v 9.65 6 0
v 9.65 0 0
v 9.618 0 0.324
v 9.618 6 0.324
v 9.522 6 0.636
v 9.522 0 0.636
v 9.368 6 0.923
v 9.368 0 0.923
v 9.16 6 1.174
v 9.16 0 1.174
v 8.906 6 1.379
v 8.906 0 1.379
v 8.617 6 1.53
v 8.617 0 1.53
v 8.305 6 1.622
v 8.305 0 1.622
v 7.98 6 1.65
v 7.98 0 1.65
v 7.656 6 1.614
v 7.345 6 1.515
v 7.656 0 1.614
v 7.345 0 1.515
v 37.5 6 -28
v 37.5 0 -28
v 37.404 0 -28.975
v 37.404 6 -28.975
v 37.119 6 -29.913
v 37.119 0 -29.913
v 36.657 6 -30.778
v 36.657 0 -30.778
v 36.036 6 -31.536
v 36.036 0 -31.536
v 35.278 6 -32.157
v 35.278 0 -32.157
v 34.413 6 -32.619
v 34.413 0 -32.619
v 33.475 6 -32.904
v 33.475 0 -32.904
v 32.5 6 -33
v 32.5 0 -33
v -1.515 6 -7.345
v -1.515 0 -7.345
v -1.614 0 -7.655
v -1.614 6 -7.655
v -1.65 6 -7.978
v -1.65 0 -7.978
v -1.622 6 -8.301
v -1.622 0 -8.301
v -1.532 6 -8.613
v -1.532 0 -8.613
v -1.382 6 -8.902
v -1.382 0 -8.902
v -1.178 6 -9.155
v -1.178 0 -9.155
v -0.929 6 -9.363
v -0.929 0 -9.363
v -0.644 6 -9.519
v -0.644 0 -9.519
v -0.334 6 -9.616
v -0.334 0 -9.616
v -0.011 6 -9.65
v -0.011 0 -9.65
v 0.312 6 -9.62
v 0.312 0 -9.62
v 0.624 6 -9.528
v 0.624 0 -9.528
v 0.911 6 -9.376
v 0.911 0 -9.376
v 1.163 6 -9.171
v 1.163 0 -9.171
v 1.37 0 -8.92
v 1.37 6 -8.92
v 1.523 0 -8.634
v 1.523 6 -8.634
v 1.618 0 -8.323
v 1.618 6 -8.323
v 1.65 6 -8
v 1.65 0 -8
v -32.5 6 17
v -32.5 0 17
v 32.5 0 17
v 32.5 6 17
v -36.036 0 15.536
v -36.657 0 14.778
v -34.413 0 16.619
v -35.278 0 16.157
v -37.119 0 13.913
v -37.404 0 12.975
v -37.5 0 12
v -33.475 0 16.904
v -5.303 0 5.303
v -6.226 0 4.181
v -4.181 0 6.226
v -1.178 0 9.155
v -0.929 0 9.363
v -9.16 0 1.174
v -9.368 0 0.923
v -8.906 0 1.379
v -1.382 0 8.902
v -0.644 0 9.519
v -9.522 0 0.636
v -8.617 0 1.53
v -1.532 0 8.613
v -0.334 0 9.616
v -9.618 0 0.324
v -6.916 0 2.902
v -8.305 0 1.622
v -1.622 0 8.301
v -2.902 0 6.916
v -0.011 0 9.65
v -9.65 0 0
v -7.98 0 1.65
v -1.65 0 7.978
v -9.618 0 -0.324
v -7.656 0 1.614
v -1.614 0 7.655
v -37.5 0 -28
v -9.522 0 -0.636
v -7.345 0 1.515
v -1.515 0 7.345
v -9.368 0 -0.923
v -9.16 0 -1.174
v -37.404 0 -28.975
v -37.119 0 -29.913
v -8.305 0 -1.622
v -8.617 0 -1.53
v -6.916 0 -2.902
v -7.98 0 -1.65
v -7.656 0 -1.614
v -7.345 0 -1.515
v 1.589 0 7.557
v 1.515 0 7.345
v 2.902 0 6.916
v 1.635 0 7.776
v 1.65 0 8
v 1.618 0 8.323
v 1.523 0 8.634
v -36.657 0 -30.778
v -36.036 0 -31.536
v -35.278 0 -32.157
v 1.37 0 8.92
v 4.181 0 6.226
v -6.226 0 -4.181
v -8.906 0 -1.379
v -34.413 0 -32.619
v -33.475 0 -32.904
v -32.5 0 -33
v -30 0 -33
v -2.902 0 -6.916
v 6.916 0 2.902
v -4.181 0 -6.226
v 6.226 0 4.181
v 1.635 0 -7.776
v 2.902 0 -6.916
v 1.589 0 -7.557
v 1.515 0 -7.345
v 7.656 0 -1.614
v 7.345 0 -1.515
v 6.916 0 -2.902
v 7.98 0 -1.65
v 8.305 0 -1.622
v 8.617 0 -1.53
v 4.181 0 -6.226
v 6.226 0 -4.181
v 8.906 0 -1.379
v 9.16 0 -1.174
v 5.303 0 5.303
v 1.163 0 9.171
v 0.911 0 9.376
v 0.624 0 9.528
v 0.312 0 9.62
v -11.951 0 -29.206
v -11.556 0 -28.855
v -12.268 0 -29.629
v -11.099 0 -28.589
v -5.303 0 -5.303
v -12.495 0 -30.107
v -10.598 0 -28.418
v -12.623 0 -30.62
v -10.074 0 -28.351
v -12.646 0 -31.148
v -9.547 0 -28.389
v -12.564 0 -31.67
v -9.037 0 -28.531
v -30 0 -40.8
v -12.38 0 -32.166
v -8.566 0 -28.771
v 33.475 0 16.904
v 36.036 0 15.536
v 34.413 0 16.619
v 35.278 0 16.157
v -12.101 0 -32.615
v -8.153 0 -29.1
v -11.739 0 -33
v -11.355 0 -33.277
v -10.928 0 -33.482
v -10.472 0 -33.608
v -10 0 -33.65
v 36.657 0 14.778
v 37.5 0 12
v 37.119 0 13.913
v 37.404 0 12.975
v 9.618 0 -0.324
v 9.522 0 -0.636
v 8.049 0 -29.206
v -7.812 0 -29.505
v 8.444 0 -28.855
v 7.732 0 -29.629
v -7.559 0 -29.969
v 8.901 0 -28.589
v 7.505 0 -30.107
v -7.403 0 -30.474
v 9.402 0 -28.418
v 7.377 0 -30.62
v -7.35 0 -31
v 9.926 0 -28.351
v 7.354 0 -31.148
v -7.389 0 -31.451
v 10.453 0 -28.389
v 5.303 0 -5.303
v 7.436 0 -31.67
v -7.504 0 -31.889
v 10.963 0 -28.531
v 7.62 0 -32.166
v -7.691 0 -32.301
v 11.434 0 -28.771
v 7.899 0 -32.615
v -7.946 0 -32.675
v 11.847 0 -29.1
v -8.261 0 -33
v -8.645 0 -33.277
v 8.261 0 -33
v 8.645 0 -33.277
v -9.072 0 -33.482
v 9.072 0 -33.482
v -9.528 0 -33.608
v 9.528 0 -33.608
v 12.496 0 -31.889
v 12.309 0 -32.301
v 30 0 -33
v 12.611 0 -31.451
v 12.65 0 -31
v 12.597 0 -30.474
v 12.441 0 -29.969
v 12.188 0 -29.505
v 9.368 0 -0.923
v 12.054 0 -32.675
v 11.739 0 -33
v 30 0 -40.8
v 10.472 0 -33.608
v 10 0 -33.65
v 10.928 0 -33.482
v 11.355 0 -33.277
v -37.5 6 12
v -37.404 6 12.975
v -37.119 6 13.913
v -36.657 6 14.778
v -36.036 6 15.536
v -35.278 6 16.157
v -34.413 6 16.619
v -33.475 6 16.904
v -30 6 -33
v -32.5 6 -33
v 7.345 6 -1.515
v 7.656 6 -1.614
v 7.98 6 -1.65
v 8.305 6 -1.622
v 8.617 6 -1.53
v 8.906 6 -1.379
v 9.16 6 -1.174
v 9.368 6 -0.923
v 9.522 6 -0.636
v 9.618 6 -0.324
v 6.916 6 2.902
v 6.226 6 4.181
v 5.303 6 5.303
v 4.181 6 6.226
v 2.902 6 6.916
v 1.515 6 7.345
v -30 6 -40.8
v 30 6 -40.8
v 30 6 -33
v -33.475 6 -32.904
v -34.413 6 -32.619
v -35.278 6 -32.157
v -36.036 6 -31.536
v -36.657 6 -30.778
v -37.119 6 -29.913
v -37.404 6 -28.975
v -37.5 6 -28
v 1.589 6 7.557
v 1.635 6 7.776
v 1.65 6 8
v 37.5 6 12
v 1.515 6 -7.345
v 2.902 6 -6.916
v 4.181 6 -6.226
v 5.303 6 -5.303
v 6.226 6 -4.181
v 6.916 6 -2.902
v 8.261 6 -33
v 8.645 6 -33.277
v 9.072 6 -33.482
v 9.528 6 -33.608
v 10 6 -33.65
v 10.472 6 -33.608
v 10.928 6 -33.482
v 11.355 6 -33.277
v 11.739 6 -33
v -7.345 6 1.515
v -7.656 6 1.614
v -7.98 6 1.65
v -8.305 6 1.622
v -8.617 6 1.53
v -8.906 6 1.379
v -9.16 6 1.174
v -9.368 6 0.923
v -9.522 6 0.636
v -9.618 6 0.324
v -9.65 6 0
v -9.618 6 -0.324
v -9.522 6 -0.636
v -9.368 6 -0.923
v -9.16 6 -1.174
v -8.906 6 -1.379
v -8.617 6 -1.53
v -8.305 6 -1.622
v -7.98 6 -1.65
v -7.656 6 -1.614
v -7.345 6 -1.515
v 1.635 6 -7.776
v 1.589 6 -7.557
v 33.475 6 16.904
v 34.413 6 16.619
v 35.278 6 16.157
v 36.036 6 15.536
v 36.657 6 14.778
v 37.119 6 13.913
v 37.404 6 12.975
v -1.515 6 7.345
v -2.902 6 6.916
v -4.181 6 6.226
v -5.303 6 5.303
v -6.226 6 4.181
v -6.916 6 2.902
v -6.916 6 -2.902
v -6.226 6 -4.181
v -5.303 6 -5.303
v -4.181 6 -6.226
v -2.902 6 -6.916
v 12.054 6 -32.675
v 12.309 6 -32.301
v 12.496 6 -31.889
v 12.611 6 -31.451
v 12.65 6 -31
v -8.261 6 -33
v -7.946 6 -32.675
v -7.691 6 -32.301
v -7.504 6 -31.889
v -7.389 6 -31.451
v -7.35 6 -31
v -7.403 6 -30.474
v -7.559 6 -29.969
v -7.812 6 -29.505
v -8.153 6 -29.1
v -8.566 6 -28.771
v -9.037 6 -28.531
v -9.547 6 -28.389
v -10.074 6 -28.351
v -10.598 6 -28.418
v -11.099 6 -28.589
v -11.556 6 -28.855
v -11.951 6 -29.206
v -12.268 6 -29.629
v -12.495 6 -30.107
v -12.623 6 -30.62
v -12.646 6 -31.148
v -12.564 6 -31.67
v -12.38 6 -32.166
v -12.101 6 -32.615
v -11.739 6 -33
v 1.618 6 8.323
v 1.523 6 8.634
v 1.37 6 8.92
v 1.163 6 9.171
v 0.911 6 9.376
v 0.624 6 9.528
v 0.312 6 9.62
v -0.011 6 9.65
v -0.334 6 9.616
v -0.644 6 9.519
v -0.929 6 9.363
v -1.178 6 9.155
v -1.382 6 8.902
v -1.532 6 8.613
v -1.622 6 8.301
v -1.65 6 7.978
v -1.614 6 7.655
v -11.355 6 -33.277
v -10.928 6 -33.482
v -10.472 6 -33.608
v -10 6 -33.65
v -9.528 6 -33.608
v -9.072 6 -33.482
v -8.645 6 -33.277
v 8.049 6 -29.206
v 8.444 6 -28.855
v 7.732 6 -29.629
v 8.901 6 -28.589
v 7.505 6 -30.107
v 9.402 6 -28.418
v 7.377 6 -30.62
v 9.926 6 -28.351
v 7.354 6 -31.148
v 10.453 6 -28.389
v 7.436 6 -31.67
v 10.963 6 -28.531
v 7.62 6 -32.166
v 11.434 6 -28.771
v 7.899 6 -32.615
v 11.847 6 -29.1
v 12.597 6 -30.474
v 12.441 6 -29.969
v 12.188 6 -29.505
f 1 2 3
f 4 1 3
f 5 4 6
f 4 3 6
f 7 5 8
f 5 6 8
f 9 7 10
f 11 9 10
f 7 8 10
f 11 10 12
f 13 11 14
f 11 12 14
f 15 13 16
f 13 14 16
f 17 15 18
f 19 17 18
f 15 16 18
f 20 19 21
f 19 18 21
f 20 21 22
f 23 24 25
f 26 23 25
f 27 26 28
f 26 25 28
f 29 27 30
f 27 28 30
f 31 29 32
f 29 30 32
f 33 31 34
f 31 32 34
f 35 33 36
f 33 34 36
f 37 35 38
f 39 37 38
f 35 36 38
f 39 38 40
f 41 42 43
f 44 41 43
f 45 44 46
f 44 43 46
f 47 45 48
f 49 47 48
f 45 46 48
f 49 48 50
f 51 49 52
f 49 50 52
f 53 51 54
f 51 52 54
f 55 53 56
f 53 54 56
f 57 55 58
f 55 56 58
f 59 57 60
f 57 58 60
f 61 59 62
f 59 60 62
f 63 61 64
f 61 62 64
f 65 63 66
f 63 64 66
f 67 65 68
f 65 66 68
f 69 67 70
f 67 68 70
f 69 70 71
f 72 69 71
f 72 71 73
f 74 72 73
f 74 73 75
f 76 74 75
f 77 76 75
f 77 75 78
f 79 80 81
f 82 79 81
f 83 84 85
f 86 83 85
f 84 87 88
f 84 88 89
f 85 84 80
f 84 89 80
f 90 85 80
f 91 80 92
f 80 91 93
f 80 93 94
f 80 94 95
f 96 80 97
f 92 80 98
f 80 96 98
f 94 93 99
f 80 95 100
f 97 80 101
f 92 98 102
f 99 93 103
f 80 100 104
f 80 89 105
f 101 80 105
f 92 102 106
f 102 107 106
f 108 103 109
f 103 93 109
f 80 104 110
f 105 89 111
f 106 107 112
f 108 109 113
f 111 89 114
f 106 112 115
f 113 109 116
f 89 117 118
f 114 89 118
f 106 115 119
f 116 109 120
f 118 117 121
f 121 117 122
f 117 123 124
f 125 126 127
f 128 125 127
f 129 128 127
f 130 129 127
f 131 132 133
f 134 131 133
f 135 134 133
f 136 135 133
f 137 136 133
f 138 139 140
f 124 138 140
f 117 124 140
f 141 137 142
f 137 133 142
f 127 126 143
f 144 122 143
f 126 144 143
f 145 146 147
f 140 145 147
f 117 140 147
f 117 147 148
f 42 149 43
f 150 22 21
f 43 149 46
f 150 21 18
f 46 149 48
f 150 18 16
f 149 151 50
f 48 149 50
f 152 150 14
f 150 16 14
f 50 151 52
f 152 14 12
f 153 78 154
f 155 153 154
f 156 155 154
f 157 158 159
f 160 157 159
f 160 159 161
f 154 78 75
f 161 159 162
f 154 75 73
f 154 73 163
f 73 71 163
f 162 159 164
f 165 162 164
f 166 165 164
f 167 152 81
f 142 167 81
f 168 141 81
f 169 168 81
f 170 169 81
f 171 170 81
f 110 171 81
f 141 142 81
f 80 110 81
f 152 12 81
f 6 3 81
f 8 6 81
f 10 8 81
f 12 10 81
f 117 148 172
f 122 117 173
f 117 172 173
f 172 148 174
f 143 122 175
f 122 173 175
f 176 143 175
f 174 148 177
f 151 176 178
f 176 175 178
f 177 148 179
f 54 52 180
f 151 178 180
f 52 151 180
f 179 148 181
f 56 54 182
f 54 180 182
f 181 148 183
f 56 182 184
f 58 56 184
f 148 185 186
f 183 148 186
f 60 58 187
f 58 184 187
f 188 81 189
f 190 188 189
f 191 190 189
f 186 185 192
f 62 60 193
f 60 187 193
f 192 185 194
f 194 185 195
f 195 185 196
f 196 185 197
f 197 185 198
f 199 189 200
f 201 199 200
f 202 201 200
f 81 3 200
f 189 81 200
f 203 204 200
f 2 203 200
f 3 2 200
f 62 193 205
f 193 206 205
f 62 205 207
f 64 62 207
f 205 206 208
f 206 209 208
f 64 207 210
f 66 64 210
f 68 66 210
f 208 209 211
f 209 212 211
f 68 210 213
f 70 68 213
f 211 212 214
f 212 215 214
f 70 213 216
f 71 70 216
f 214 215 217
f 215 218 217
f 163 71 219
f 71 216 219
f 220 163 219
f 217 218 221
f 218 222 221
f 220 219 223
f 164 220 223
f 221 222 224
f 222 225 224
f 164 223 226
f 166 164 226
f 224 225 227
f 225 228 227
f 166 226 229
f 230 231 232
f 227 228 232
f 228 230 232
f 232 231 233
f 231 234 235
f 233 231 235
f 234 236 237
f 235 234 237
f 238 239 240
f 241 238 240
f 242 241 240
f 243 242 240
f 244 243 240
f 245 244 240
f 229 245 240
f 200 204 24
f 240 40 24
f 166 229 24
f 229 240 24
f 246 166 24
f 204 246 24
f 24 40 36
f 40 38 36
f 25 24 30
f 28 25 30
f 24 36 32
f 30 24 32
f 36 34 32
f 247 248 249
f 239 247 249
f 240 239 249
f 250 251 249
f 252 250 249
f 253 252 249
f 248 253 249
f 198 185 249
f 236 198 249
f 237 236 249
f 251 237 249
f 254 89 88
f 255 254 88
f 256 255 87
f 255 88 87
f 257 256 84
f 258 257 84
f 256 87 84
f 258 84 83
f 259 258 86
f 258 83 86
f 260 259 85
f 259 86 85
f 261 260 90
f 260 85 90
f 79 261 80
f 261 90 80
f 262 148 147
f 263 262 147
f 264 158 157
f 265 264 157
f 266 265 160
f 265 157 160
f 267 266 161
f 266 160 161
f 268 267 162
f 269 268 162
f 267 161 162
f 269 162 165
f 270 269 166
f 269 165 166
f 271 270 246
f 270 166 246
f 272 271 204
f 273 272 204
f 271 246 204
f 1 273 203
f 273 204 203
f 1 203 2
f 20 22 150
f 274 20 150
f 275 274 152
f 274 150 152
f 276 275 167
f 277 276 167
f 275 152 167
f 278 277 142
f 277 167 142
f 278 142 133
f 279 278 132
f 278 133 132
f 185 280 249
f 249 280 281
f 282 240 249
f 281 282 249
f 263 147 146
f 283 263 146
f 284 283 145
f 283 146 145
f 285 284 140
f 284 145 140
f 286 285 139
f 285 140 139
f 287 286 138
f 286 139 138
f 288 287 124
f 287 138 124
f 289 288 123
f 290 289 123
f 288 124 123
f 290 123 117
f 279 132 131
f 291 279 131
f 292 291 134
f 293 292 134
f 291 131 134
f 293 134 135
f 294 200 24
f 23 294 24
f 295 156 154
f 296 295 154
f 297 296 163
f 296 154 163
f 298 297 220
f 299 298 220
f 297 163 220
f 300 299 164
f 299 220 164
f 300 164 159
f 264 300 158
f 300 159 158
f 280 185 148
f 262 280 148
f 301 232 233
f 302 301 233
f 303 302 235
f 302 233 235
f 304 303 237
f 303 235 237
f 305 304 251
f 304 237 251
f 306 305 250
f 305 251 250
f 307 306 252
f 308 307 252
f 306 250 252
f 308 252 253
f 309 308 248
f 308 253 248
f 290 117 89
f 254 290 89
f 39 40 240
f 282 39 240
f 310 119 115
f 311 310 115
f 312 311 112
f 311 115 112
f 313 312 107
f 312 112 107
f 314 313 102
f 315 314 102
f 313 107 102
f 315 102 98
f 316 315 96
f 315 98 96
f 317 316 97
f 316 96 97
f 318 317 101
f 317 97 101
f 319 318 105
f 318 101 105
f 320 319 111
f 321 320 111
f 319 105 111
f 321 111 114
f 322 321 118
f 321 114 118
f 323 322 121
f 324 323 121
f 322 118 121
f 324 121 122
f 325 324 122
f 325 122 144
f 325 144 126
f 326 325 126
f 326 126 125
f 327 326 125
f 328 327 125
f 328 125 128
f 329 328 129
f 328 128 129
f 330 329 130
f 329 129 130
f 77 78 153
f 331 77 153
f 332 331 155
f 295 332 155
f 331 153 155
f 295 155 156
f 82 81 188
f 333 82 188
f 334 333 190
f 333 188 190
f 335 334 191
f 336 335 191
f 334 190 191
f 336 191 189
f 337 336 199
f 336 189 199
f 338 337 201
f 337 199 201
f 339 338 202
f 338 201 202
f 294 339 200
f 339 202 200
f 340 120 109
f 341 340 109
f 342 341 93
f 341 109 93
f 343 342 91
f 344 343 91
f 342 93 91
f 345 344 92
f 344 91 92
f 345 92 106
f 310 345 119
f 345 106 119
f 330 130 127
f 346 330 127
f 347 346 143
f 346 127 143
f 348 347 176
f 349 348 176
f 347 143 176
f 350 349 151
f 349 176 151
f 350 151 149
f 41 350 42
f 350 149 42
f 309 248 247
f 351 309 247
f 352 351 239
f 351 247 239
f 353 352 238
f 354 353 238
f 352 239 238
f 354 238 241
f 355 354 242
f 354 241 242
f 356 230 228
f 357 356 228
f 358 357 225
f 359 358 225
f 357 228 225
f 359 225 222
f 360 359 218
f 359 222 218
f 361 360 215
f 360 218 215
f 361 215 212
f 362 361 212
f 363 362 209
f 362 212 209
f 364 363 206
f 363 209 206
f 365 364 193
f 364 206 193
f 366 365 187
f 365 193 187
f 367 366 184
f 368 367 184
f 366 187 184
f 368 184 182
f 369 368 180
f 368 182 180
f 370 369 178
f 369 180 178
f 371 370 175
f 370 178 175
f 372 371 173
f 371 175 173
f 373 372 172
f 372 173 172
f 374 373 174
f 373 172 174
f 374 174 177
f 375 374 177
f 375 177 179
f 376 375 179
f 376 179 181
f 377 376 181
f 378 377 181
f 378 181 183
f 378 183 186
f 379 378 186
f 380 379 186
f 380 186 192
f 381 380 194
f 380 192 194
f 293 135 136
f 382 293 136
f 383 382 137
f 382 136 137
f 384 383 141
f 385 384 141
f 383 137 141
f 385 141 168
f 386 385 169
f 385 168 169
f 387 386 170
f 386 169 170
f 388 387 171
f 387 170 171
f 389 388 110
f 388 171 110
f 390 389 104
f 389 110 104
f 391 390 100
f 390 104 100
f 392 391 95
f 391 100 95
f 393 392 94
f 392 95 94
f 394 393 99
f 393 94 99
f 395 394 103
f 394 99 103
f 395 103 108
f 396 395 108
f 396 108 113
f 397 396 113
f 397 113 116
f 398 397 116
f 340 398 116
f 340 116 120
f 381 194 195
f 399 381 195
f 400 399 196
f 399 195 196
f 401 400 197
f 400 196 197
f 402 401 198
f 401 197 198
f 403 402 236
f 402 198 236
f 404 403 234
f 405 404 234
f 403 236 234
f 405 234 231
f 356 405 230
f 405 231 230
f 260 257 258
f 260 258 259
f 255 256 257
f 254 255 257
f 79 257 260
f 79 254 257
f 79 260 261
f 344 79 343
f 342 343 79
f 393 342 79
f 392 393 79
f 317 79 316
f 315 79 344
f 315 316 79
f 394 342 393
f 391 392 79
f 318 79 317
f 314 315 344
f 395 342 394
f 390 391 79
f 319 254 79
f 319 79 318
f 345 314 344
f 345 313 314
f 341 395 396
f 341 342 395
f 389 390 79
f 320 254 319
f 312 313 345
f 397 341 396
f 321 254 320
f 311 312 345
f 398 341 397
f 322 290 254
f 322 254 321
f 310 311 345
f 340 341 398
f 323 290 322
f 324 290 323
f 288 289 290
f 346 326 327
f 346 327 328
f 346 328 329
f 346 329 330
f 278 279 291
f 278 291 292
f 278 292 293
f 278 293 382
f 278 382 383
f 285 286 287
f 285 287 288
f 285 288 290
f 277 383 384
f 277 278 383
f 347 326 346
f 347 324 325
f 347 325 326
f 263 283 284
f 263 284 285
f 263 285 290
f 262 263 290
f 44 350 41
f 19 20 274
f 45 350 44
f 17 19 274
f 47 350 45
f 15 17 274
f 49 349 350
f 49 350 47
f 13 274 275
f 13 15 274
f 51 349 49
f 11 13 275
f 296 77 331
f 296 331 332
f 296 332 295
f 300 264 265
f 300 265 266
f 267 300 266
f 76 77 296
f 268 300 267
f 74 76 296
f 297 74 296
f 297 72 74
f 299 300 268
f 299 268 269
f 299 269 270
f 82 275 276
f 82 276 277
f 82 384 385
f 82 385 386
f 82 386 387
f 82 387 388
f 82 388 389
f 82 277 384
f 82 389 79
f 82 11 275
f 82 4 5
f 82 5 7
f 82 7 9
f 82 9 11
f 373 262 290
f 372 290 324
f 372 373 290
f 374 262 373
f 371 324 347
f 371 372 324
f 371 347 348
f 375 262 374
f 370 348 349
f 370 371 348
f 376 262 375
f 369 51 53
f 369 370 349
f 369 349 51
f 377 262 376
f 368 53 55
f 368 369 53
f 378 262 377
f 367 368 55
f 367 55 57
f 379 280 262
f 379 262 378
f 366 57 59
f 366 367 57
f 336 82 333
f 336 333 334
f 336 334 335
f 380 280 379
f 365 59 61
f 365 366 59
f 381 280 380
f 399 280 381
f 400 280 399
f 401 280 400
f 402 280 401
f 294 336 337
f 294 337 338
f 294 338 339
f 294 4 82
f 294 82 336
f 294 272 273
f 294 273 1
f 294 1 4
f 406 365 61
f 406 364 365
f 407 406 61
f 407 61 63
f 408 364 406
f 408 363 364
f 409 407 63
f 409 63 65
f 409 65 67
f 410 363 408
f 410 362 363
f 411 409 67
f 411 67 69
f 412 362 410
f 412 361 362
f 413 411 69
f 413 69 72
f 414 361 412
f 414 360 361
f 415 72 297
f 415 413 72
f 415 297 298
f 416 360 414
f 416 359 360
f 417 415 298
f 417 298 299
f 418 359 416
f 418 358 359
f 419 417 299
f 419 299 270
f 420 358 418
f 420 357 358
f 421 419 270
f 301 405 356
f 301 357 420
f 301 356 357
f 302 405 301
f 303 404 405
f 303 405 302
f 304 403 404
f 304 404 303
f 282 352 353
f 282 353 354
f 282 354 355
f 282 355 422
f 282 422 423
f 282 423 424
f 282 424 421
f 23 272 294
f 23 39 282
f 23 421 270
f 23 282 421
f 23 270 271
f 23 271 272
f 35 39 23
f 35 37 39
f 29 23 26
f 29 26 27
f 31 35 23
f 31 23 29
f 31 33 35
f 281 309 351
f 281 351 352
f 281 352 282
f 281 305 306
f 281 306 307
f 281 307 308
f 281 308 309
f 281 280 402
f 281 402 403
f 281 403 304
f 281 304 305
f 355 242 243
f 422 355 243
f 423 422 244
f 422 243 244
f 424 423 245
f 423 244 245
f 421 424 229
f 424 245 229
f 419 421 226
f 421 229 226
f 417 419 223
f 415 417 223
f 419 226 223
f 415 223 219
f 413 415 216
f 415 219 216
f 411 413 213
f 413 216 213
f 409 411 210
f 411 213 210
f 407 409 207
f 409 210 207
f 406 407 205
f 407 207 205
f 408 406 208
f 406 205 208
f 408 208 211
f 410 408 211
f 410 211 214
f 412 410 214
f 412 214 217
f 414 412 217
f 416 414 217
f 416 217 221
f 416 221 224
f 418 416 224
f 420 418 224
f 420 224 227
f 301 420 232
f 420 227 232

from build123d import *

# Parameters (mm, degrees)
EXTRUDE_1_DEPTH     = 6
SKETCH_2_W          = 60
SKETCH_2_H          = 2
CUT_EXTRUDE_1_DEPTH = 10


with BuildPart() as part:
    # 草图1 → 凸台-拉伸1 (new body)
    with BuildSketch(Plane(origin=(0, 0, 0), x_dir=(1, 0, 0), z_dir=(0, 1, 0))):
        with BuildLine():
            ThreePointArc((-32.5, 33), (-36.035533906, 31.535533906), (-37.5, 28))
            Line((-37.5, 28), (-37.5, 13))
            Line((-37.5, 13), (-37.5, -12))
            ThreePointArc((-37.5, -12), (-36.035533906, -15.535533906), (-32.5, -17))
            Line((-32.5, -17), (32.5, -17))
            ThreePointArc((32.5, -17), (36.035533906, -15.535533906), (37.5, -12))
            Line((37.5, -12), (37.5, 13))
            Line((37.5, 13), (37.5, 28))
            ThreePointArc((37.5, 28), (36.035533906, 31.535533906), (32.5, 33))
            Line((32.5, 33), (30, 33))
            Line((30, 33), (30, 42.800232859))
            Line((30, 42.800232859), (-30, 42.800232859))
            Line((-30, 42.800232859), (-30, 33))
            Line((-30, 33), (-32.5, 33))
        make_face()
        with BuildLine():
            ThreePointArc((1.514624984, 7.34546875), (5.303300859, 5.303300859), (7.34546875, 1.514624984))
            ThreePointArc((7.34546875, 1.514624984), (8.906234914, 1.378853974), (9.65, 0))
            ThreePointArc((9.65, 0), (8.906234914, -1.378853974), (7.34546875, -1.514624984))
            ThreePointArc((7.34546875, -1.514624984), (5.303300859, -5.303300859), (1.514624984, -7.34546875))
            ThreePointArc((1.514624984, -7.34546875), (1.615801848, -7.665807858), (1.65, -8))
            ThreePointArc((1.65, -8), (-0.334192142, -9.615801848), (-1.514624984, -7.34546875))
            ThreePointArc((-1.514624984, -7.34546875), (-5.303300859, -5.303300859), (-7.34546875, -1.514624984))
            ThreePointArc((-7.34546875, -1.514624984), (-9.65, 0), (-7.34546875, 1.514624984))
            ThreePointArc((-7.34546875, 1.514624984), (-5.303300859, 5.303300859), (-1.514624984, 7.34546875))
            ThreePointArc((-1.514624984, 7.34546875), (-0.334192142, 9.615801848), (1.65, 8))
            ThreePointArc((1.65, 8), (1.615801848, 7.665807858), (1.514624984, 7.34546875))
        make_face(mode=Mode.SUBTRACT)
        with BuildLine():
            ThreePointArc((-7.35, 31), (-11.098950694, 28.588608831), (-11.738533865, 33))
            ThreePointArc((-11.738533865, 33), (-10, 33.65), (-8.261466135, 33))
            ThreePointArc((-8.261466135, 33), (-7.588608831, 32.098950694), (-7.35, 31))
        make_face(mode=Mode.SUBTRACT)
        with BuildLine():
            ThreePointArc((12.65, 31), (8.901049306, 28.588608831), (8.261466135, 33))
            ThreePointArc((8.261466135, 33), (10, 33.65), (11.738533865, 33))
            ThreePointArc((11.738533865, 33), (12.411391169, 32.098950694), (12.65, 31))
        make_face(mode=Mode.SUBTRACT)
    extrude(amount=EXTRUDE_1_DEPTH)

    # 草图2 → 切除-拉伸1 (cut)
    with BuildSketch(Plane(origin=(0, 6, 0), x_dir=(1, 0, 0), z_dir=(0, 1, 0))):
        with Locations((0, 41.800232859)):
            Rectangle(SKETCH_2_W, SKETCH_2_H)
    extrude(amount=-CUT_EXTRUDE_1_DEPTH, mode=Mode.SUBTRACT)


solid = part.part
